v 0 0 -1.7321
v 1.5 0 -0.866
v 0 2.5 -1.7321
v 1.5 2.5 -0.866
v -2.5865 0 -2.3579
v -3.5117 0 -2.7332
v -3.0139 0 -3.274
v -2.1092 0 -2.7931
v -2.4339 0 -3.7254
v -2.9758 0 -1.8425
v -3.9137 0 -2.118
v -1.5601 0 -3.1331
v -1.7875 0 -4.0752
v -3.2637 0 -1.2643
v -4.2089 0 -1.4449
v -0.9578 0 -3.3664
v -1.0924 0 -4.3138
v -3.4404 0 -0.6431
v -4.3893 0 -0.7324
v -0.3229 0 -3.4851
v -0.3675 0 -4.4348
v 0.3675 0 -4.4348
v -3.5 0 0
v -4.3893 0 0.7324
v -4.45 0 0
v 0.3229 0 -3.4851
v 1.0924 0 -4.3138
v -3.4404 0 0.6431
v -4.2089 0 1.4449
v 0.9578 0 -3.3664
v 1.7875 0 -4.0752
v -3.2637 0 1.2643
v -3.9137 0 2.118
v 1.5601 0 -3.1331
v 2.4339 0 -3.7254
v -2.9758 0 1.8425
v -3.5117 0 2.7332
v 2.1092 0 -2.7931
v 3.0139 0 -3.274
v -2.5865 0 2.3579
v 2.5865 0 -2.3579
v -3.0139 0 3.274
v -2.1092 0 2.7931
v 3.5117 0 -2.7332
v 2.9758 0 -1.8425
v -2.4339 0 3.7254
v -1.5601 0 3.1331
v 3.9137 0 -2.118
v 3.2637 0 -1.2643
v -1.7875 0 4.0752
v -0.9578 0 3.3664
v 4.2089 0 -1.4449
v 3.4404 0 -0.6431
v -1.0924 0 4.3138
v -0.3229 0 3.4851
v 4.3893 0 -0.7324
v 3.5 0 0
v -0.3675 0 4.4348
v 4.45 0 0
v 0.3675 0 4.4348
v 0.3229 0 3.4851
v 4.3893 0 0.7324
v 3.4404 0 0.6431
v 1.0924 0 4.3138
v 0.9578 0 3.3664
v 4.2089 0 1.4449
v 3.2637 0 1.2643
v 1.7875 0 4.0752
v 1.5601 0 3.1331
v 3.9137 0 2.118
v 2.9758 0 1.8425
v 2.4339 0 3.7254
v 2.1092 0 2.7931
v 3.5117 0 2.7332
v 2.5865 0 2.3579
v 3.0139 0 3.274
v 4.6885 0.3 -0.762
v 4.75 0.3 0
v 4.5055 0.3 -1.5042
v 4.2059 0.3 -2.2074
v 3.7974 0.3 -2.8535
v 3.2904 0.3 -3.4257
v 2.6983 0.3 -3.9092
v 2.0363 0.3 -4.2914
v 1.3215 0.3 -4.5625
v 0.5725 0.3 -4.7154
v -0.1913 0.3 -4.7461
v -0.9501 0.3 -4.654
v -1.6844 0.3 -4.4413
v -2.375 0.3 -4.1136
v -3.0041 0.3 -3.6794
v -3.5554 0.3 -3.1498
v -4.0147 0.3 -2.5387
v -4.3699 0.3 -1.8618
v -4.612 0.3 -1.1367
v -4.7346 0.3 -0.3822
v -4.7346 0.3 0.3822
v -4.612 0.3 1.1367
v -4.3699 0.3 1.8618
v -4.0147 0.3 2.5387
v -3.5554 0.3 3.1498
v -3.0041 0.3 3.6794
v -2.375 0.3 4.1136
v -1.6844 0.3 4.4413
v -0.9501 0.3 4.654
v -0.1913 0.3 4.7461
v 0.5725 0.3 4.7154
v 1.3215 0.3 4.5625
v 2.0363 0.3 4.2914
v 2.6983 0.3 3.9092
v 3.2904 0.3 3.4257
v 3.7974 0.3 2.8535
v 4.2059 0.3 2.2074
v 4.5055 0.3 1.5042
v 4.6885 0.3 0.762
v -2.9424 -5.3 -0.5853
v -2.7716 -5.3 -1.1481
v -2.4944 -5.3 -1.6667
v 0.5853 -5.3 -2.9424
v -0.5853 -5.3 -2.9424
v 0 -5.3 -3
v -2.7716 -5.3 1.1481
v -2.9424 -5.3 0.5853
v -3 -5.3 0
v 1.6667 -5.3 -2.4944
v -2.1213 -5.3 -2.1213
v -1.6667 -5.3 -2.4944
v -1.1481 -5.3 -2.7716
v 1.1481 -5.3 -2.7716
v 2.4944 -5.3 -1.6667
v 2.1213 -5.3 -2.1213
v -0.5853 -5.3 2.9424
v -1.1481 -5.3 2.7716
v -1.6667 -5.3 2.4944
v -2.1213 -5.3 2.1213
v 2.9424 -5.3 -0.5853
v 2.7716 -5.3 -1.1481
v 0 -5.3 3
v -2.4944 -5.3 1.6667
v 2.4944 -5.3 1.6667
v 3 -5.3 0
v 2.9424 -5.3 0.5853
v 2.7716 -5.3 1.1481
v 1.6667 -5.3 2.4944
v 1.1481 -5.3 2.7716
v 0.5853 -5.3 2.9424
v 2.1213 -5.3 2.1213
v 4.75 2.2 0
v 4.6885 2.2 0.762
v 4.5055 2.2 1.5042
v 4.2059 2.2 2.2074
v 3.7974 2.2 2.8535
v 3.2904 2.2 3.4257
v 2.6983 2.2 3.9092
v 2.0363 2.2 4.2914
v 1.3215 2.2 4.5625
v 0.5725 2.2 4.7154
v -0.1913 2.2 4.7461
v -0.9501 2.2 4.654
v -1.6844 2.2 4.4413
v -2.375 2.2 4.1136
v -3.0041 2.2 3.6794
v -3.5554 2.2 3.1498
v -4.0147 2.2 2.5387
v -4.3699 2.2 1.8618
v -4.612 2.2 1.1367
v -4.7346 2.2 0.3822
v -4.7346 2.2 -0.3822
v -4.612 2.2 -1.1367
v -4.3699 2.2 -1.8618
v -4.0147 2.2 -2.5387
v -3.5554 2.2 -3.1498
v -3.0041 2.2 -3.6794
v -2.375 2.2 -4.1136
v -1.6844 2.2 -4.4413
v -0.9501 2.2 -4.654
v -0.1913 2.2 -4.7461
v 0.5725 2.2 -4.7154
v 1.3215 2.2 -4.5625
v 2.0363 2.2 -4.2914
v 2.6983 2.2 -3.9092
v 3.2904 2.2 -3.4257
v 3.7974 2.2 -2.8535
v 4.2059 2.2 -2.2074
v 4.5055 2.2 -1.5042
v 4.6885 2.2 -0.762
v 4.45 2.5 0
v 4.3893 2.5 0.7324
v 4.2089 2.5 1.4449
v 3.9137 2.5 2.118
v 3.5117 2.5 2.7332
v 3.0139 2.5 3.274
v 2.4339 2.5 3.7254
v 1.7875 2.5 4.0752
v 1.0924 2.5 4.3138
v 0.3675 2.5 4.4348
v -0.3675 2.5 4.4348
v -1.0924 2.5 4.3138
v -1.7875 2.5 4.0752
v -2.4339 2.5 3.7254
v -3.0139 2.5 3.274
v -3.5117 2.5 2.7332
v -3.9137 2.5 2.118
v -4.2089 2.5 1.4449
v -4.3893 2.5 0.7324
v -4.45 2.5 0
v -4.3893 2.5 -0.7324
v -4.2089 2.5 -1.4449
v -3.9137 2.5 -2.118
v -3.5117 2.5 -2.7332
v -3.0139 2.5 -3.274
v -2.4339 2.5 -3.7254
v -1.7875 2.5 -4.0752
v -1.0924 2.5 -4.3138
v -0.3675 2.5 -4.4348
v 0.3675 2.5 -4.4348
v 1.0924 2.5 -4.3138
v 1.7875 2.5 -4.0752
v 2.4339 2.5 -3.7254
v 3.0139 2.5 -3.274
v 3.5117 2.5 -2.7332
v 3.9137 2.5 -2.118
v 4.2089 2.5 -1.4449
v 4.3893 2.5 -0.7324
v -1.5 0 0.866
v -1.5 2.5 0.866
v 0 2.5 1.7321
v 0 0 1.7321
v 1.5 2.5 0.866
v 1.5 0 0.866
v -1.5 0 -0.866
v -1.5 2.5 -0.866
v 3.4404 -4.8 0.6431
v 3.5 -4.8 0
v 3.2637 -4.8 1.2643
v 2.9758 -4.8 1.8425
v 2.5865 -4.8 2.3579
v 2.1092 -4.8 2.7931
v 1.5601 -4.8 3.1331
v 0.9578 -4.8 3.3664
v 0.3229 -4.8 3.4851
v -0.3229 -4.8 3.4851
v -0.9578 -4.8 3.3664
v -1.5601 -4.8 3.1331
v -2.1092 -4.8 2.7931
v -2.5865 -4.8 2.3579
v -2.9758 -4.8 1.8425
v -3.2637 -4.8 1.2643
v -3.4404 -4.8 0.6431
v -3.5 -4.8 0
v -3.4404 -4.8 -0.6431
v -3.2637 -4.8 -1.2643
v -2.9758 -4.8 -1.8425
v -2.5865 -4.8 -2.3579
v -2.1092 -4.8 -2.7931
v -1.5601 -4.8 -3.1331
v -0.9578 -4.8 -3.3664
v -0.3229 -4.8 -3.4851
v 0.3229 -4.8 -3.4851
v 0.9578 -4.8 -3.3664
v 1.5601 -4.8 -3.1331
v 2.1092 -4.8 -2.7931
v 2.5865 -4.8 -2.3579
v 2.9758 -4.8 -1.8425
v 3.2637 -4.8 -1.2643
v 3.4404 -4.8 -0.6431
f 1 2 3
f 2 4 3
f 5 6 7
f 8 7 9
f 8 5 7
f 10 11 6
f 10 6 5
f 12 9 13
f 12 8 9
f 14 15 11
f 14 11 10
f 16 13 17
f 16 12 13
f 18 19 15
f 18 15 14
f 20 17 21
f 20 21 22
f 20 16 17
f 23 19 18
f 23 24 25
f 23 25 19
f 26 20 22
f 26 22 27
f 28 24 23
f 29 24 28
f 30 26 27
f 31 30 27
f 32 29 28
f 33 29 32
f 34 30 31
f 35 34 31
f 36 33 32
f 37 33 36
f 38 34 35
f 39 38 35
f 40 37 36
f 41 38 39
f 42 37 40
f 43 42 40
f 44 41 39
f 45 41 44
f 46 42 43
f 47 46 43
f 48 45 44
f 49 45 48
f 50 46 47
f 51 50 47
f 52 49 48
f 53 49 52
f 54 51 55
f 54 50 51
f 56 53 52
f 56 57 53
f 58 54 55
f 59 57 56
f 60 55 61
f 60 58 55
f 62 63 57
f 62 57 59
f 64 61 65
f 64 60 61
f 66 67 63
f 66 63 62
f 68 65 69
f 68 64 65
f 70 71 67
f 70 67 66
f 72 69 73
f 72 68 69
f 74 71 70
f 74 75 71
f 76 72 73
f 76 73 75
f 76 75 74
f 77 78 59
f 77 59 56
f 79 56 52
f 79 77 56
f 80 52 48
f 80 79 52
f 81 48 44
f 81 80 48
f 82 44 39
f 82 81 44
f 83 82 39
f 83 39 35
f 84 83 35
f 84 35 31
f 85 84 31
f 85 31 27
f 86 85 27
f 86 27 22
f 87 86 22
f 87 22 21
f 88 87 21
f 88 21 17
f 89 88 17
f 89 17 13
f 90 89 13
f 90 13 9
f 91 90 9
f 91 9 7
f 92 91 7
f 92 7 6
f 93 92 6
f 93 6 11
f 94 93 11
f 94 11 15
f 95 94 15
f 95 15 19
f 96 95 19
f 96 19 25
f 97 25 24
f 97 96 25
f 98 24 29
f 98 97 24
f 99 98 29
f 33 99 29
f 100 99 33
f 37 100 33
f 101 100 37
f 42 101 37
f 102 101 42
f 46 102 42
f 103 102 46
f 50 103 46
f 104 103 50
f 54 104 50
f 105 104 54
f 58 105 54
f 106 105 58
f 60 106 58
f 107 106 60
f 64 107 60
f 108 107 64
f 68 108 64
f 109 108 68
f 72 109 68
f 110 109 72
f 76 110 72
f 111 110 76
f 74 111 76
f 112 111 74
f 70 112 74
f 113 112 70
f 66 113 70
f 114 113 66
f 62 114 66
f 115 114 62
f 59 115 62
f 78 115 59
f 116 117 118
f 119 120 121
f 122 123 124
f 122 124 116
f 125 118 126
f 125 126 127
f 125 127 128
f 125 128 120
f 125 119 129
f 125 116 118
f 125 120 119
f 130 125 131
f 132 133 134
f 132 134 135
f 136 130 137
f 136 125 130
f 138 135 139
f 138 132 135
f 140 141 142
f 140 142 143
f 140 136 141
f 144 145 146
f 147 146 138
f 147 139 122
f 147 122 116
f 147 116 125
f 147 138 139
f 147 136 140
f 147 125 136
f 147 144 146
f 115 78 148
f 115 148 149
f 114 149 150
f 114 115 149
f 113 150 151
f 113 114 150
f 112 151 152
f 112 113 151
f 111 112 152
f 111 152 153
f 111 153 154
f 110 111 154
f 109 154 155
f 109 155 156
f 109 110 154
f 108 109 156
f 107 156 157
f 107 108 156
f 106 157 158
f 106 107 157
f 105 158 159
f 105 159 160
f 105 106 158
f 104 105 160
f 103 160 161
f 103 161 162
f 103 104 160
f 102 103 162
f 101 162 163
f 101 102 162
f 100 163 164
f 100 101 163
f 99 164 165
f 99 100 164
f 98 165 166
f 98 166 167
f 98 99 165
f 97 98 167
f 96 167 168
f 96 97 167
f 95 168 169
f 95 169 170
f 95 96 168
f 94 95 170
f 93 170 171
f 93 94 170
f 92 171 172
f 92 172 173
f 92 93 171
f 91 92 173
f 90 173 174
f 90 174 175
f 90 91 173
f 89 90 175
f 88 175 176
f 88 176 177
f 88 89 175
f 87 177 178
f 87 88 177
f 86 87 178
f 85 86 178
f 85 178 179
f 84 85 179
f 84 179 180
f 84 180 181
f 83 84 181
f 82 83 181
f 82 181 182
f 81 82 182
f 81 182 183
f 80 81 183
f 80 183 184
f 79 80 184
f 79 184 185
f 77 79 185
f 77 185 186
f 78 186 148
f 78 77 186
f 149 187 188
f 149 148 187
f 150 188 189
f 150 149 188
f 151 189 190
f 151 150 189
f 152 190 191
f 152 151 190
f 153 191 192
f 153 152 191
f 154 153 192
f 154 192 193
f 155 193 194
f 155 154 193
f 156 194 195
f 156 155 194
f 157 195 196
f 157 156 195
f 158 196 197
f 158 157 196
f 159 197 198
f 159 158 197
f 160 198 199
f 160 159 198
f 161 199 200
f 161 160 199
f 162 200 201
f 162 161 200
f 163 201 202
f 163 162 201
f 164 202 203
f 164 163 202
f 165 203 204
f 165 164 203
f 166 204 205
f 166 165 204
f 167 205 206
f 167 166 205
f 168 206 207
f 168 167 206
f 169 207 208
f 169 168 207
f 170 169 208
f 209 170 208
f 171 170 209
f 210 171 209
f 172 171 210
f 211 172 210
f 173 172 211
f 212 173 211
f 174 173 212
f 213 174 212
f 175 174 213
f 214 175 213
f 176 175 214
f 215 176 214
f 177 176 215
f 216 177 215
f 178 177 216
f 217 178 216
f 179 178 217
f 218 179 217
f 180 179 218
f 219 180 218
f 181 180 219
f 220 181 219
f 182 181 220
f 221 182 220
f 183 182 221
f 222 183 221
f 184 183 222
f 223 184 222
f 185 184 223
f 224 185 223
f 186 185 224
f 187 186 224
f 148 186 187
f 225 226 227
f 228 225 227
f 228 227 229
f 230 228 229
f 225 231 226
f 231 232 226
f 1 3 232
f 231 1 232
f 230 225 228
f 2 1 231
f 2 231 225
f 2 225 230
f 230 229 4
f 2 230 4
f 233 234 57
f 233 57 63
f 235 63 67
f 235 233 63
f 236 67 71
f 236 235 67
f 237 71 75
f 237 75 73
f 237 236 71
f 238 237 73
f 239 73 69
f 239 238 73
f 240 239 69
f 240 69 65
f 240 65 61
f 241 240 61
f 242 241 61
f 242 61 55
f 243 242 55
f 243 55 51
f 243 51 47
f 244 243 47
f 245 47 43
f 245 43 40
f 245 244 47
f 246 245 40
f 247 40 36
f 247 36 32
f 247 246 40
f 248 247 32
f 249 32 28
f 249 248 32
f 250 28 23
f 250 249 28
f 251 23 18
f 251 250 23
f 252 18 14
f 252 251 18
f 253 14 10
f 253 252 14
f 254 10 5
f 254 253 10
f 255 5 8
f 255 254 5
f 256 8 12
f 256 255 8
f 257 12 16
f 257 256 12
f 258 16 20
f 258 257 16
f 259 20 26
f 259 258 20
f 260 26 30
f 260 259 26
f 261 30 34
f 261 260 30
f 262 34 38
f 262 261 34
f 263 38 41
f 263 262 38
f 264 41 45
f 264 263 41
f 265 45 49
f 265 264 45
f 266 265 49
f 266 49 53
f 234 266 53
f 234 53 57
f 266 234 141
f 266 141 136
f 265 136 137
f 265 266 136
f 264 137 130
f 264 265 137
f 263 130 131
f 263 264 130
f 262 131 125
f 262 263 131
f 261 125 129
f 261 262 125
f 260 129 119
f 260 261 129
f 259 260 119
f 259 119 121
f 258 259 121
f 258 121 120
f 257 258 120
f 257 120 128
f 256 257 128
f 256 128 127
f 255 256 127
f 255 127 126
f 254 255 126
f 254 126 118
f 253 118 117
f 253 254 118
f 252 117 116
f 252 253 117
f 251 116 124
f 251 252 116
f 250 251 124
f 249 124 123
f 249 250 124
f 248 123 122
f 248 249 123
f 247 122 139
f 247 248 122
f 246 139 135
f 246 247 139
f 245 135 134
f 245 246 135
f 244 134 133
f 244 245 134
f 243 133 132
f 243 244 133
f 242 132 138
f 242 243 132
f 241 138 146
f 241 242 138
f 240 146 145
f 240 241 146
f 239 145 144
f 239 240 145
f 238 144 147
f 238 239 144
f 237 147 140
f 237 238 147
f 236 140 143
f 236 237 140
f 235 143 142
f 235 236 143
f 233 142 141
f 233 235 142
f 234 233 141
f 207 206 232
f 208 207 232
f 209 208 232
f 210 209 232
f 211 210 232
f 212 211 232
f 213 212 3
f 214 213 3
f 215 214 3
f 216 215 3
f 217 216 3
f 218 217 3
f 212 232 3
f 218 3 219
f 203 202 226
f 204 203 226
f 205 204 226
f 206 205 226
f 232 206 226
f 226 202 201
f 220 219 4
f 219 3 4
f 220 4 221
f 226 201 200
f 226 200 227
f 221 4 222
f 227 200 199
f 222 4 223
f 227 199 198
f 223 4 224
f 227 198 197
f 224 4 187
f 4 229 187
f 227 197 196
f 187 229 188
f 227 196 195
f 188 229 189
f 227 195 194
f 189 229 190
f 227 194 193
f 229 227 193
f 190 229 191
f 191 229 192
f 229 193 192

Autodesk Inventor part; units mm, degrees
sketch "Sketch_1" plane through (0, 0, 0) normal (0, 0, 1) x (1, 0, 0)
  line L0 (0, -5.3) -> (0, 2.5)
  line L1 (0, 2.5) -> (4.45, 2.5)
  line L2 (4.45, 2.5) -> (4.75, 2.2)
  line L3 (4.75, 2.2) -> (4.75, 0.3)
  line L4 (4.75, 0.3) -> (4.45, 0)
  line L5 (4.45, 0) -> (3.5, 0)
  line L6 (3.5, 0) -> (3.5, -4.8)
  line L7 (3.5, -4.8) -> (3, -5.3)
  line L8 (3, -5.3) -> (0, -5.3)
  line L9 (0, -5.3) -> (0, 2.5)
revolve "Revolution1" add sketch "Sketch_1" angle 360 about axis through (0, -5.3, 0) along (0, -1, 0)
thread "Thread1" size "M7x1" class "6g" standard "ISO Metric profile" full length
sketch "Sketch_4" plane through (0, 2.5, 0) normal (0, 1, 0) x (1, 0, 0)
  line L0 (-1.5, -0.866) -> (0, -1.7321)
  line L1 (0, -1.7321) -> (1.5, -0.866)
  line L2 (1.5, -0.866) -> (1.5, 0.866)
  line L3 (1.5, 0.866) -> (0, 1.7321)
  line L4 (0, 1.7321) -> (-1.5, 0.866)
  line L5 (-1.5, 0.866) -> (-1.5, -0.866)
extrude "Extrusion1" cut sketch "Sketch_4" against normal blind 2.5
ref_plane "din_908_XY" through (0, 0, 0) normal (0, 1, 0) x (1, 0, 0)
ref_plane "din_908_YZ" through (0, 0, 0) normal (1, 0, 0) x (0, 0, -1)
ref_plane "din_908_ZX" through (0, 0, 0) normal (0, 0, -1) x (0, 1, 0)
properties part number "Verschlussschraube DIN908 M7"
